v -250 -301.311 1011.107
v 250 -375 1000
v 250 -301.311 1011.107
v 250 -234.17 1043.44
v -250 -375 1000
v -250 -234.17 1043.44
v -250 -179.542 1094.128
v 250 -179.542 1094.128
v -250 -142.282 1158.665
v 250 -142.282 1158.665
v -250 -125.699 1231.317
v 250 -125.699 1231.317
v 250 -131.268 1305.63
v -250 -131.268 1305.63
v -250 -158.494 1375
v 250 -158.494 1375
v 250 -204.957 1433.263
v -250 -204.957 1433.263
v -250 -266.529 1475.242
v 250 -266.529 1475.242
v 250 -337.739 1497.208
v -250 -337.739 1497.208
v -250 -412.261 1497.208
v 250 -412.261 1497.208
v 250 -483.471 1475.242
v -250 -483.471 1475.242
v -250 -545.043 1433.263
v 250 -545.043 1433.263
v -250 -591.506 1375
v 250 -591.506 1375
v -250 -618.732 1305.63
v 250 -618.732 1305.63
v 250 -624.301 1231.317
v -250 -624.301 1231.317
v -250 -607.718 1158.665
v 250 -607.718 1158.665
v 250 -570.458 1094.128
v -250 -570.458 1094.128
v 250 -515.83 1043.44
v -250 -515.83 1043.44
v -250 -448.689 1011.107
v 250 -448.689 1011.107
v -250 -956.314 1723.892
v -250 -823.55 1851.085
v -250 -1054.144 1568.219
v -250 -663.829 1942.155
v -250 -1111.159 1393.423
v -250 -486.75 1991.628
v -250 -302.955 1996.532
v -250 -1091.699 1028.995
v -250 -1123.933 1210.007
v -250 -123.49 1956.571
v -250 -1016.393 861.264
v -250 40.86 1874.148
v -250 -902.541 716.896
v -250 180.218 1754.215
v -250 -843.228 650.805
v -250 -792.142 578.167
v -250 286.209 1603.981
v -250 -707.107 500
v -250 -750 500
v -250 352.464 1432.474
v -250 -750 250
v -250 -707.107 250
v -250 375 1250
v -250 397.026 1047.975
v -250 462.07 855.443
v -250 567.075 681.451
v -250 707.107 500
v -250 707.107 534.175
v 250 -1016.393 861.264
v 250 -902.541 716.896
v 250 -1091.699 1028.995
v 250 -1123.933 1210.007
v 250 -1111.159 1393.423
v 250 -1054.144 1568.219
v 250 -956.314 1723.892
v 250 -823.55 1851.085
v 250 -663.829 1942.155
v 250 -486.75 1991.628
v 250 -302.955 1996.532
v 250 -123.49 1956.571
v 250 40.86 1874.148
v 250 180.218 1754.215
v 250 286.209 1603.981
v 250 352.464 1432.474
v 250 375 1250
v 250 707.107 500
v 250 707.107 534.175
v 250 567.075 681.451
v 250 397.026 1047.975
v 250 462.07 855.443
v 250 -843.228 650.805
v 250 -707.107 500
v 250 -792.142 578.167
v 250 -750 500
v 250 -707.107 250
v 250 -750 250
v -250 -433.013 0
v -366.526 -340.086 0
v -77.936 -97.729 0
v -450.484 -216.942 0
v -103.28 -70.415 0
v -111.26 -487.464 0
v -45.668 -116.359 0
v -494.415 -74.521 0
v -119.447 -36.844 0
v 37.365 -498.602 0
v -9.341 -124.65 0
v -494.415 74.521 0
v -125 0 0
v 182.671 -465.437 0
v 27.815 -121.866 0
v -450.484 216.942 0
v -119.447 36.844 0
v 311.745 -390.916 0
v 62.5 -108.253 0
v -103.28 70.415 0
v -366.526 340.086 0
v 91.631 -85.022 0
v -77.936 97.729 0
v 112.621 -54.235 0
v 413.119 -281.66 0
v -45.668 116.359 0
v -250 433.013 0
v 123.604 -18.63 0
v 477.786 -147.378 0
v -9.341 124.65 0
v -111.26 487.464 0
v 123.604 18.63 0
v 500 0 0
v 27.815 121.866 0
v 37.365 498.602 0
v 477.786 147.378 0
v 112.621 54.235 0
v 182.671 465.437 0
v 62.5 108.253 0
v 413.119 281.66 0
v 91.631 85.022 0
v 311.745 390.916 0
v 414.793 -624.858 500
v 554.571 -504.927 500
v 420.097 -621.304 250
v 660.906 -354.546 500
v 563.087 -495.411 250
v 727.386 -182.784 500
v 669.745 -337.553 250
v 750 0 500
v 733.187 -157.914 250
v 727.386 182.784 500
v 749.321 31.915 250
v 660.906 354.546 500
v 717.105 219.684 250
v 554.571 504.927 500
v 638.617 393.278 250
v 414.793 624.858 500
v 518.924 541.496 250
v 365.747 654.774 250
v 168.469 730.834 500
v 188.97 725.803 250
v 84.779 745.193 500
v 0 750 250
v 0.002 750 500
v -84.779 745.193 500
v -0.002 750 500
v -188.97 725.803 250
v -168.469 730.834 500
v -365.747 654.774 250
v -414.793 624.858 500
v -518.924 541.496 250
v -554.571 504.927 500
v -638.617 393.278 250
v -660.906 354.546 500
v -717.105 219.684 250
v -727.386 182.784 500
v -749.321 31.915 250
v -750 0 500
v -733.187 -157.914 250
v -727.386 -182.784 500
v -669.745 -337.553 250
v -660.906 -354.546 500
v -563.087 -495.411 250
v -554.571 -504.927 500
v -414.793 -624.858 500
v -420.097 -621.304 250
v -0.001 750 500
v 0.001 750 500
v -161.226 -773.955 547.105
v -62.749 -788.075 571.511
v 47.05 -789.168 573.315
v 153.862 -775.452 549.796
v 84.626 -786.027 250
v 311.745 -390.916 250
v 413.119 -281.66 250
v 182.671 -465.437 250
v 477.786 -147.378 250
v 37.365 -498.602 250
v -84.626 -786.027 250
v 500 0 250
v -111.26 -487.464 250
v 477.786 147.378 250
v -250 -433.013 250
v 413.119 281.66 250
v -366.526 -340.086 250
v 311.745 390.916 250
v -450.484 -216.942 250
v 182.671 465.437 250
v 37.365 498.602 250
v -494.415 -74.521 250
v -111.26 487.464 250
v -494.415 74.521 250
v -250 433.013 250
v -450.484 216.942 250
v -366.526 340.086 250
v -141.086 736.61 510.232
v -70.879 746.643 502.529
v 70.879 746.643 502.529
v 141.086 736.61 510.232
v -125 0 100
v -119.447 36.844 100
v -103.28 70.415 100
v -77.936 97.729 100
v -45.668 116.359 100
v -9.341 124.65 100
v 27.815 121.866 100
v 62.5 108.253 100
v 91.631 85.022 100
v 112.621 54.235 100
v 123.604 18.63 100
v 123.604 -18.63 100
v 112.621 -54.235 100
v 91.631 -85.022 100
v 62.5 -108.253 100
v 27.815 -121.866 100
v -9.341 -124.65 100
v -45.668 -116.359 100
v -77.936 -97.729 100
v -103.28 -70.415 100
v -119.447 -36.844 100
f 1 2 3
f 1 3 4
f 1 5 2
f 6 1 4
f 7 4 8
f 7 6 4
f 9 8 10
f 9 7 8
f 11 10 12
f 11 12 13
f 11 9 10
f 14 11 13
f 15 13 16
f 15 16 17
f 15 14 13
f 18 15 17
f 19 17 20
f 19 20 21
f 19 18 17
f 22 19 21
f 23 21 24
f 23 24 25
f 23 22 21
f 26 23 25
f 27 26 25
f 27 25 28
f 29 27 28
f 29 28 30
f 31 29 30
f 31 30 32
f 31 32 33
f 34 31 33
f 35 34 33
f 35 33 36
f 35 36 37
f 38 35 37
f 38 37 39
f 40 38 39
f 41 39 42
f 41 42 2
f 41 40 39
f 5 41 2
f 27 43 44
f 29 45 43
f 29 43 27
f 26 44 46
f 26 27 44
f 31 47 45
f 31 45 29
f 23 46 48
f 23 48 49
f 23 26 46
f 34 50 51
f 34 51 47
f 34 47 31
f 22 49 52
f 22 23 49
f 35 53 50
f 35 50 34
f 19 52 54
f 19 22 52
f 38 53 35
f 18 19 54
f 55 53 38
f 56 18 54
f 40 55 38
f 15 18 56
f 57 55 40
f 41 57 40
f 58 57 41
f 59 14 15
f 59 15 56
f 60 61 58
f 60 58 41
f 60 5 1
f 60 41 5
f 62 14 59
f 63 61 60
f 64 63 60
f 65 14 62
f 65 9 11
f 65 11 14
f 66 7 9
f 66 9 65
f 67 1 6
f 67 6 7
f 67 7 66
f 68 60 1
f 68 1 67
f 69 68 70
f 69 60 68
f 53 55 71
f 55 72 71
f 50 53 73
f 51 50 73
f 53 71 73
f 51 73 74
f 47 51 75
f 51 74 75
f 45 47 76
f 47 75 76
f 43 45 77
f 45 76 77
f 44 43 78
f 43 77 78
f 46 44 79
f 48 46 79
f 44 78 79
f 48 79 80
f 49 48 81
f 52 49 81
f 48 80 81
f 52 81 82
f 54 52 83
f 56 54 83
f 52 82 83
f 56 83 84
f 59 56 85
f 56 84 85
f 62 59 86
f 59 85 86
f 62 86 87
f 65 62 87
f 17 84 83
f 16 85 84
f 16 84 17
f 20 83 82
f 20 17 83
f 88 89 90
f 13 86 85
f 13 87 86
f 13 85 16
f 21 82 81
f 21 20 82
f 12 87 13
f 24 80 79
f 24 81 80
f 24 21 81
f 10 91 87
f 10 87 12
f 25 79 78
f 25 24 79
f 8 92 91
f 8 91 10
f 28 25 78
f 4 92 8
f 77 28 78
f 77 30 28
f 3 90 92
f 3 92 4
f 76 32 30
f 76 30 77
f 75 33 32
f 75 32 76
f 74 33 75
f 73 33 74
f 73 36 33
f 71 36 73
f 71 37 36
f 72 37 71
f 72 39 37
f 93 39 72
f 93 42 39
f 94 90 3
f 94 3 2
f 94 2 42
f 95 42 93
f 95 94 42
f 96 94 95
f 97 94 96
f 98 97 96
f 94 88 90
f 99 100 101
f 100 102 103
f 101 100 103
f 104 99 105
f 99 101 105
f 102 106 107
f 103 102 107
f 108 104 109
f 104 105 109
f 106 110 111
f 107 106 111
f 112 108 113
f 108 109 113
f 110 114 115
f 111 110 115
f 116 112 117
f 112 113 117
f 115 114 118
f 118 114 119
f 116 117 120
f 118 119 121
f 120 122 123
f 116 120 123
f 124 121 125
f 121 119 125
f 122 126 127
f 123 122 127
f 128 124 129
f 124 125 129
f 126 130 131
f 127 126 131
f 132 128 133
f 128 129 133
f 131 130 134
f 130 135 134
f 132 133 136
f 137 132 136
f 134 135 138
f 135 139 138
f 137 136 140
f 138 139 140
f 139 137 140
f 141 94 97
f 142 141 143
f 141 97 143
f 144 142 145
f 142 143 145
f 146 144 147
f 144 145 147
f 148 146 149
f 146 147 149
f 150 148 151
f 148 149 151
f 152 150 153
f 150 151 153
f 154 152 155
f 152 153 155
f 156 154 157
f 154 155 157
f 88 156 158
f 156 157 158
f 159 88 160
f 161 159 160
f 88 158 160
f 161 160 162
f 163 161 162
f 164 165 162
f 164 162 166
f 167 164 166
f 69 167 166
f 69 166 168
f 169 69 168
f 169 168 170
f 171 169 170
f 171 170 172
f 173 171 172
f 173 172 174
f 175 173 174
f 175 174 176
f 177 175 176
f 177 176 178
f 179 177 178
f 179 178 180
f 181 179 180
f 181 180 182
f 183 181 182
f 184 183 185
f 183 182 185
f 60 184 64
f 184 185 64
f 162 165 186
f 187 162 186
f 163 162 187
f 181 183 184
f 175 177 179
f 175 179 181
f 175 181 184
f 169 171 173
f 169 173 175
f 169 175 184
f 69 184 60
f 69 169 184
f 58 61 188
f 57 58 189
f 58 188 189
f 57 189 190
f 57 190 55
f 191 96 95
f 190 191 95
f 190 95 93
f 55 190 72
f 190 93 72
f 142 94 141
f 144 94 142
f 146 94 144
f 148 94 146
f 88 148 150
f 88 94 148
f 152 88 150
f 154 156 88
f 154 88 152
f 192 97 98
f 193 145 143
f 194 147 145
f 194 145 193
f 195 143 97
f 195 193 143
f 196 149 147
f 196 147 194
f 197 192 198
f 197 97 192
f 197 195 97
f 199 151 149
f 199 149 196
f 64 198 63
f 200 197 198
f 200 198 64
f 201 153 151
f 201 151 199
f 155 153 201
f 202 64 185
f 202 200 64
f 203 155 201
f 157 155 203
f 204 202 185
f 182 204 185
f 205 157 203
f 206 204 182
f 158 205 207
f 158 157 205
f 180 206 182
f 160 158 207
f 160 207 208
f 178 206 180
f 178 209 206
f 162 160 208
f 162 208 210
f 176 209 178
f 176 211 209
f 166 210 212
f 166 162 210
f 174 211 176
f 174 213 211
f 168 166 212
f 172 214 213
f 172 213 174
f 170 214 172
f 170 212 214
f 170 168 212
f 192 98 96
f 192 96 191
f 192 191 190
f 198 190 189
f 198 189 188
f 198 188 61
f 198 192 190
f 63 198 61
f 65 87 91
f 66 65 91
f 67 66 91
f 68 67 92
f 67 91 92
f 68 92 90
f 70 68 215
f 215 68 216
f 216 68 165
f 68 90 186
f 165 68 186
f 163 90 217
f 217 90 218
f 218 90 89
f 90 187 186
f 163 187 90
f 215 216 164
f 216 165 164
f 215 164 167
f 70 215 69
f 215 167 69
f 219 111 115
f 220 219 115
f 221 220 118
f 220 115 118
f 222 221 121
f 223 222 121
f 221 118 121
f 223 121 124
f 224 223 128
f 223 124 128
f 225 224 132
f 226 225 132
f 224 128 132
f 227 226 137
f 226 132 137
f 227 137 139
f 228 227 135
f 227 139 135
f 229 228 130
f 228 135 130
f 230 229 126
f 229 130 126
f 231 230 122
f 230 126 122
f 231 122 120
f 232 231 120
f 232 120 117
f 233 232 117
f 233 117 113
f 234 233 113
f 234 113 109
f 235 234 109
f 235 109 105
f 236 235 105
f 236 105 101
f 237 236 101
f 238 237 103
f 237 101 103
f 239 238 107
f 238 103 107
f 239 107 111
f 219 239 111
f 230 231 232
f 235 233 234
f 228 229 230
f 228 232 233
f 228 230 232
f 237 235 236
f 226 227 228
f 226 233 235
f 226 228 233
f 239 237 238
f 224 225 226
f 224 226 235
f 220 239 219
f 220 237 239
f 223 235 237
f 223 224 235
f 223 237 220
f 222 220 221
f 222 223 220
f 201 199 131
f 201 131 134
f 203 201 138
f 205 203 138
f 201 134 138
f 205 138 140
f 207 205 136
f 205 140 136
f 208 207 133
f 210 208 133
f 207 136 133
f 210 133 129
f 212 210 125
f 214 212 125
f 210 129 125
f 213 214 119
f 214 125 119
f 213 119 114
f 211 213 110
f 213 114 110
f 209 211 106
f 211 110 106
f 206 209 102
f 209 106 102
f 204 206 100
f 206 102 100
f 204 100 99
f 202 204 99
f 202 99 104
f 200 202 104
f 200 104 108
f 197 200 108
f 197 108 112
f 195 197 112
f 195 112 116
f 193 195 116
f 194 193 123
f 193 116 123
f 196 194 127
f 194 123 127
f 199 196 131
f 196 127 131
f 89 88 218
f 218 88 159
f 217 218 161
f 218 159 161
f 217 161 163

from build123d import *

# Parameters (mm, degrees)
SKETCH1_R                = 500
BOSS_EXTRUDE1_DEPTH      = 250
SKETCH3_R                = 125
CUT_EXTRUDE1_DEPTH       = 100
SKETCH4_R                = 750
BOSS_EXTRUDE2_DEPTH      = 250
SKETCH5_R                = 250
BOSS_EXTRUDE4_DEPTH      = 250
CUT_EXTRUDE2_DEPTH       = 500
CUT_EXTRUDE5_DEPTH       = 500
BOSS_EXTRUDE5_START      = 250
BOSS_EXTRUDE5_DEPTH      = 250
BOSS_EXTRUDE6_START      = 250
BOSS_EXTRUDE6_DEPTH      = 250
BOSS_EXTRUDE7_REACH      = 2213.476
BOSS_EXTRUDE7_END_RADIUS = 750


with BuildPart() as part:
    # Sketch1 → Boss-Extrude1 (new body)
    with BuildSketch(Plane.XY):
        Circle(SKETCH1_R)
    extrude(amount=BOSS_EXTRUDE1_DEPTH)

    # Sketch3 → Cut-Extrude1 (cut)
    with BuildSketch(Plane(origin=(0, 0, 0), x_dir=(-1, 0, 0), z_dir=(0, 0, -1))):
        Circle(SKETCH3_R)
    extrude(amount=-CUT_EXTRUDE1_DEPTH, mode=Mode.SUBTRACT)

    # Sketch4 → Boss-Extrude2 (add)
    with BuildSketch(Plane.XY.offset(250)):
        Circle(SKETCH4_R)
    extrude(amount=BOSS_EXTRUDE2_DEPTH)

    # Sketch5 → Boss-Extrude4 (add, symmetric)
    with BuildSketch(Plane(origin=(0, 0, 0), x_dir=(0, 0, -1), z_dir=(1, 0, 0))):
        with BuildLine():
            Line((-500, 750), (-500, -750))
            ThreePointArc((-500, -750), (-615.24272839, -816.608980403), (-716.895581803, -902.541163606))
            ThreePointArc((-716.895581803, -902.541163606), (-1942.154561028, -663.82877912), (-1250, 375))
            ThreePointArc((-1250, 375), (-830.737254219, 473.974508438), (-500, 750))
        make_face()
        with Locations((-1250, -375)):
            Circle(SKETCH5_R, mode=Mode.SUBTRACT)
    extrude(amount=BOSS_EXTRUDE4_DEPTH, both=True)

    # Sketch8 → Cut-Extrude2 (cut)
    with BuildSketch(Plane(origin=(0, 0, 500), x_dir=(-1, 0, 0), z_dir=(0, 0, -1))):
        with BuildLine():
            Line((-250, 750), (-250, 707.106781187))
            ThreePointArc((-250, 707.106781187), (-126.826484044, 739.19891974), (0, 750))
            Line((0, 750), (-250, 750))
        make_face()
    extrude(amount=-CUT_EXTRUDE2_DEPTH, mode=Mode.SUBTRACT)

    # Sketch10 → Cut-Extrude5 (cut)
    with BuildSketch(Plane(origin=(0, 0, 500), x_dir=(-1, 0, 0), z_dir=(0, 0, -1))):
        with BuildLine():
            Line((250, 750), (0, 750))
            ThreePointArc((0, 750), (126.826484044, 739.19891974), (250, 707.106781187))
            Line((250, 707.106781187), (250, 750))
        make_face()
    extrude(amount=-CUT_EXTRUDE5_DEPTH, mode=Mode.SUBTRACT)

    # Sketch11 → Boss-Extrude5 (add)
    with BuildSketch(Plane(origin=(0, 0, 500), x_dir=(-1, 0, 0), z_dir=(0, 0, -1)).offset(BOSS_EXTRUDE5_START)):
        with BuildLine():
            Line((250, -750), (250, -707.106781187))
            ThreePointArc((250, -707.106781187), (126.826484044, -739.19891974), (0, -750))
            Line((0, -750), (250, -750))
        make_face()
    extrude(amount=-BOSS_EXTRUDE5_DEPTH)

    # Sketch12 → Boss-Extrude6 (add)
    with BuildSketch(Plane(origin=(0, 0, 500), x_dir=(-1, 0, 0), z_dir=(0, 0, -1)).offset(BOSS_EXTRUDE6_START)):
        with BuildLine():
            Line((-250, -750), (0, -750))
            ThreePointArc((0, -750), (-126.826484044, -739.19891974), (-250, -707.106781187))
            Line((-250, -707.106781187), (-250, -750))
        make_face()
    extrude(amount=-BOSS_EXTRUDE6_DEPTH)

    # Boss-Extrude7: up to this cylinder (the profile starts inside it)
    boss_extrude7_end = Plane(origin=(0, -1430.082327212, 183.791163606), z_dir=(-1, 0, 0)) * Cylinder(BOSS_EXTRUDE7_END_RADIUS, 5927.952, mode=Mode.PRIVATE)
    # Sketch15 → Boss-Extrude7 (add, up to the surface)
    with BuildSketch(Plane(origin=(0, 0, 250), x_dir=(-1, 0, 0), z_dir=(0, 0, -1)), mode=Mode.PRIVATE) as boss_extrude7_sk1:
        with BuildLine():
            Line((250, -750), (-250, -750))
            ThreePointArc((-250, -750), (0, -790.569415042), (250, -750))
        make_face()
    boss_extrude7_tool1 = extrude(boss_extrude7_sk1.sketch, amount=-BOSS_EXTRUDE7_REACH, mode=Mode.PRIVATE) & boss_extrude7_end
    add(boss_extrude7_tool1.solids().sort_by_distance((0, -766.263993, 250))[0])


solid = part.part
